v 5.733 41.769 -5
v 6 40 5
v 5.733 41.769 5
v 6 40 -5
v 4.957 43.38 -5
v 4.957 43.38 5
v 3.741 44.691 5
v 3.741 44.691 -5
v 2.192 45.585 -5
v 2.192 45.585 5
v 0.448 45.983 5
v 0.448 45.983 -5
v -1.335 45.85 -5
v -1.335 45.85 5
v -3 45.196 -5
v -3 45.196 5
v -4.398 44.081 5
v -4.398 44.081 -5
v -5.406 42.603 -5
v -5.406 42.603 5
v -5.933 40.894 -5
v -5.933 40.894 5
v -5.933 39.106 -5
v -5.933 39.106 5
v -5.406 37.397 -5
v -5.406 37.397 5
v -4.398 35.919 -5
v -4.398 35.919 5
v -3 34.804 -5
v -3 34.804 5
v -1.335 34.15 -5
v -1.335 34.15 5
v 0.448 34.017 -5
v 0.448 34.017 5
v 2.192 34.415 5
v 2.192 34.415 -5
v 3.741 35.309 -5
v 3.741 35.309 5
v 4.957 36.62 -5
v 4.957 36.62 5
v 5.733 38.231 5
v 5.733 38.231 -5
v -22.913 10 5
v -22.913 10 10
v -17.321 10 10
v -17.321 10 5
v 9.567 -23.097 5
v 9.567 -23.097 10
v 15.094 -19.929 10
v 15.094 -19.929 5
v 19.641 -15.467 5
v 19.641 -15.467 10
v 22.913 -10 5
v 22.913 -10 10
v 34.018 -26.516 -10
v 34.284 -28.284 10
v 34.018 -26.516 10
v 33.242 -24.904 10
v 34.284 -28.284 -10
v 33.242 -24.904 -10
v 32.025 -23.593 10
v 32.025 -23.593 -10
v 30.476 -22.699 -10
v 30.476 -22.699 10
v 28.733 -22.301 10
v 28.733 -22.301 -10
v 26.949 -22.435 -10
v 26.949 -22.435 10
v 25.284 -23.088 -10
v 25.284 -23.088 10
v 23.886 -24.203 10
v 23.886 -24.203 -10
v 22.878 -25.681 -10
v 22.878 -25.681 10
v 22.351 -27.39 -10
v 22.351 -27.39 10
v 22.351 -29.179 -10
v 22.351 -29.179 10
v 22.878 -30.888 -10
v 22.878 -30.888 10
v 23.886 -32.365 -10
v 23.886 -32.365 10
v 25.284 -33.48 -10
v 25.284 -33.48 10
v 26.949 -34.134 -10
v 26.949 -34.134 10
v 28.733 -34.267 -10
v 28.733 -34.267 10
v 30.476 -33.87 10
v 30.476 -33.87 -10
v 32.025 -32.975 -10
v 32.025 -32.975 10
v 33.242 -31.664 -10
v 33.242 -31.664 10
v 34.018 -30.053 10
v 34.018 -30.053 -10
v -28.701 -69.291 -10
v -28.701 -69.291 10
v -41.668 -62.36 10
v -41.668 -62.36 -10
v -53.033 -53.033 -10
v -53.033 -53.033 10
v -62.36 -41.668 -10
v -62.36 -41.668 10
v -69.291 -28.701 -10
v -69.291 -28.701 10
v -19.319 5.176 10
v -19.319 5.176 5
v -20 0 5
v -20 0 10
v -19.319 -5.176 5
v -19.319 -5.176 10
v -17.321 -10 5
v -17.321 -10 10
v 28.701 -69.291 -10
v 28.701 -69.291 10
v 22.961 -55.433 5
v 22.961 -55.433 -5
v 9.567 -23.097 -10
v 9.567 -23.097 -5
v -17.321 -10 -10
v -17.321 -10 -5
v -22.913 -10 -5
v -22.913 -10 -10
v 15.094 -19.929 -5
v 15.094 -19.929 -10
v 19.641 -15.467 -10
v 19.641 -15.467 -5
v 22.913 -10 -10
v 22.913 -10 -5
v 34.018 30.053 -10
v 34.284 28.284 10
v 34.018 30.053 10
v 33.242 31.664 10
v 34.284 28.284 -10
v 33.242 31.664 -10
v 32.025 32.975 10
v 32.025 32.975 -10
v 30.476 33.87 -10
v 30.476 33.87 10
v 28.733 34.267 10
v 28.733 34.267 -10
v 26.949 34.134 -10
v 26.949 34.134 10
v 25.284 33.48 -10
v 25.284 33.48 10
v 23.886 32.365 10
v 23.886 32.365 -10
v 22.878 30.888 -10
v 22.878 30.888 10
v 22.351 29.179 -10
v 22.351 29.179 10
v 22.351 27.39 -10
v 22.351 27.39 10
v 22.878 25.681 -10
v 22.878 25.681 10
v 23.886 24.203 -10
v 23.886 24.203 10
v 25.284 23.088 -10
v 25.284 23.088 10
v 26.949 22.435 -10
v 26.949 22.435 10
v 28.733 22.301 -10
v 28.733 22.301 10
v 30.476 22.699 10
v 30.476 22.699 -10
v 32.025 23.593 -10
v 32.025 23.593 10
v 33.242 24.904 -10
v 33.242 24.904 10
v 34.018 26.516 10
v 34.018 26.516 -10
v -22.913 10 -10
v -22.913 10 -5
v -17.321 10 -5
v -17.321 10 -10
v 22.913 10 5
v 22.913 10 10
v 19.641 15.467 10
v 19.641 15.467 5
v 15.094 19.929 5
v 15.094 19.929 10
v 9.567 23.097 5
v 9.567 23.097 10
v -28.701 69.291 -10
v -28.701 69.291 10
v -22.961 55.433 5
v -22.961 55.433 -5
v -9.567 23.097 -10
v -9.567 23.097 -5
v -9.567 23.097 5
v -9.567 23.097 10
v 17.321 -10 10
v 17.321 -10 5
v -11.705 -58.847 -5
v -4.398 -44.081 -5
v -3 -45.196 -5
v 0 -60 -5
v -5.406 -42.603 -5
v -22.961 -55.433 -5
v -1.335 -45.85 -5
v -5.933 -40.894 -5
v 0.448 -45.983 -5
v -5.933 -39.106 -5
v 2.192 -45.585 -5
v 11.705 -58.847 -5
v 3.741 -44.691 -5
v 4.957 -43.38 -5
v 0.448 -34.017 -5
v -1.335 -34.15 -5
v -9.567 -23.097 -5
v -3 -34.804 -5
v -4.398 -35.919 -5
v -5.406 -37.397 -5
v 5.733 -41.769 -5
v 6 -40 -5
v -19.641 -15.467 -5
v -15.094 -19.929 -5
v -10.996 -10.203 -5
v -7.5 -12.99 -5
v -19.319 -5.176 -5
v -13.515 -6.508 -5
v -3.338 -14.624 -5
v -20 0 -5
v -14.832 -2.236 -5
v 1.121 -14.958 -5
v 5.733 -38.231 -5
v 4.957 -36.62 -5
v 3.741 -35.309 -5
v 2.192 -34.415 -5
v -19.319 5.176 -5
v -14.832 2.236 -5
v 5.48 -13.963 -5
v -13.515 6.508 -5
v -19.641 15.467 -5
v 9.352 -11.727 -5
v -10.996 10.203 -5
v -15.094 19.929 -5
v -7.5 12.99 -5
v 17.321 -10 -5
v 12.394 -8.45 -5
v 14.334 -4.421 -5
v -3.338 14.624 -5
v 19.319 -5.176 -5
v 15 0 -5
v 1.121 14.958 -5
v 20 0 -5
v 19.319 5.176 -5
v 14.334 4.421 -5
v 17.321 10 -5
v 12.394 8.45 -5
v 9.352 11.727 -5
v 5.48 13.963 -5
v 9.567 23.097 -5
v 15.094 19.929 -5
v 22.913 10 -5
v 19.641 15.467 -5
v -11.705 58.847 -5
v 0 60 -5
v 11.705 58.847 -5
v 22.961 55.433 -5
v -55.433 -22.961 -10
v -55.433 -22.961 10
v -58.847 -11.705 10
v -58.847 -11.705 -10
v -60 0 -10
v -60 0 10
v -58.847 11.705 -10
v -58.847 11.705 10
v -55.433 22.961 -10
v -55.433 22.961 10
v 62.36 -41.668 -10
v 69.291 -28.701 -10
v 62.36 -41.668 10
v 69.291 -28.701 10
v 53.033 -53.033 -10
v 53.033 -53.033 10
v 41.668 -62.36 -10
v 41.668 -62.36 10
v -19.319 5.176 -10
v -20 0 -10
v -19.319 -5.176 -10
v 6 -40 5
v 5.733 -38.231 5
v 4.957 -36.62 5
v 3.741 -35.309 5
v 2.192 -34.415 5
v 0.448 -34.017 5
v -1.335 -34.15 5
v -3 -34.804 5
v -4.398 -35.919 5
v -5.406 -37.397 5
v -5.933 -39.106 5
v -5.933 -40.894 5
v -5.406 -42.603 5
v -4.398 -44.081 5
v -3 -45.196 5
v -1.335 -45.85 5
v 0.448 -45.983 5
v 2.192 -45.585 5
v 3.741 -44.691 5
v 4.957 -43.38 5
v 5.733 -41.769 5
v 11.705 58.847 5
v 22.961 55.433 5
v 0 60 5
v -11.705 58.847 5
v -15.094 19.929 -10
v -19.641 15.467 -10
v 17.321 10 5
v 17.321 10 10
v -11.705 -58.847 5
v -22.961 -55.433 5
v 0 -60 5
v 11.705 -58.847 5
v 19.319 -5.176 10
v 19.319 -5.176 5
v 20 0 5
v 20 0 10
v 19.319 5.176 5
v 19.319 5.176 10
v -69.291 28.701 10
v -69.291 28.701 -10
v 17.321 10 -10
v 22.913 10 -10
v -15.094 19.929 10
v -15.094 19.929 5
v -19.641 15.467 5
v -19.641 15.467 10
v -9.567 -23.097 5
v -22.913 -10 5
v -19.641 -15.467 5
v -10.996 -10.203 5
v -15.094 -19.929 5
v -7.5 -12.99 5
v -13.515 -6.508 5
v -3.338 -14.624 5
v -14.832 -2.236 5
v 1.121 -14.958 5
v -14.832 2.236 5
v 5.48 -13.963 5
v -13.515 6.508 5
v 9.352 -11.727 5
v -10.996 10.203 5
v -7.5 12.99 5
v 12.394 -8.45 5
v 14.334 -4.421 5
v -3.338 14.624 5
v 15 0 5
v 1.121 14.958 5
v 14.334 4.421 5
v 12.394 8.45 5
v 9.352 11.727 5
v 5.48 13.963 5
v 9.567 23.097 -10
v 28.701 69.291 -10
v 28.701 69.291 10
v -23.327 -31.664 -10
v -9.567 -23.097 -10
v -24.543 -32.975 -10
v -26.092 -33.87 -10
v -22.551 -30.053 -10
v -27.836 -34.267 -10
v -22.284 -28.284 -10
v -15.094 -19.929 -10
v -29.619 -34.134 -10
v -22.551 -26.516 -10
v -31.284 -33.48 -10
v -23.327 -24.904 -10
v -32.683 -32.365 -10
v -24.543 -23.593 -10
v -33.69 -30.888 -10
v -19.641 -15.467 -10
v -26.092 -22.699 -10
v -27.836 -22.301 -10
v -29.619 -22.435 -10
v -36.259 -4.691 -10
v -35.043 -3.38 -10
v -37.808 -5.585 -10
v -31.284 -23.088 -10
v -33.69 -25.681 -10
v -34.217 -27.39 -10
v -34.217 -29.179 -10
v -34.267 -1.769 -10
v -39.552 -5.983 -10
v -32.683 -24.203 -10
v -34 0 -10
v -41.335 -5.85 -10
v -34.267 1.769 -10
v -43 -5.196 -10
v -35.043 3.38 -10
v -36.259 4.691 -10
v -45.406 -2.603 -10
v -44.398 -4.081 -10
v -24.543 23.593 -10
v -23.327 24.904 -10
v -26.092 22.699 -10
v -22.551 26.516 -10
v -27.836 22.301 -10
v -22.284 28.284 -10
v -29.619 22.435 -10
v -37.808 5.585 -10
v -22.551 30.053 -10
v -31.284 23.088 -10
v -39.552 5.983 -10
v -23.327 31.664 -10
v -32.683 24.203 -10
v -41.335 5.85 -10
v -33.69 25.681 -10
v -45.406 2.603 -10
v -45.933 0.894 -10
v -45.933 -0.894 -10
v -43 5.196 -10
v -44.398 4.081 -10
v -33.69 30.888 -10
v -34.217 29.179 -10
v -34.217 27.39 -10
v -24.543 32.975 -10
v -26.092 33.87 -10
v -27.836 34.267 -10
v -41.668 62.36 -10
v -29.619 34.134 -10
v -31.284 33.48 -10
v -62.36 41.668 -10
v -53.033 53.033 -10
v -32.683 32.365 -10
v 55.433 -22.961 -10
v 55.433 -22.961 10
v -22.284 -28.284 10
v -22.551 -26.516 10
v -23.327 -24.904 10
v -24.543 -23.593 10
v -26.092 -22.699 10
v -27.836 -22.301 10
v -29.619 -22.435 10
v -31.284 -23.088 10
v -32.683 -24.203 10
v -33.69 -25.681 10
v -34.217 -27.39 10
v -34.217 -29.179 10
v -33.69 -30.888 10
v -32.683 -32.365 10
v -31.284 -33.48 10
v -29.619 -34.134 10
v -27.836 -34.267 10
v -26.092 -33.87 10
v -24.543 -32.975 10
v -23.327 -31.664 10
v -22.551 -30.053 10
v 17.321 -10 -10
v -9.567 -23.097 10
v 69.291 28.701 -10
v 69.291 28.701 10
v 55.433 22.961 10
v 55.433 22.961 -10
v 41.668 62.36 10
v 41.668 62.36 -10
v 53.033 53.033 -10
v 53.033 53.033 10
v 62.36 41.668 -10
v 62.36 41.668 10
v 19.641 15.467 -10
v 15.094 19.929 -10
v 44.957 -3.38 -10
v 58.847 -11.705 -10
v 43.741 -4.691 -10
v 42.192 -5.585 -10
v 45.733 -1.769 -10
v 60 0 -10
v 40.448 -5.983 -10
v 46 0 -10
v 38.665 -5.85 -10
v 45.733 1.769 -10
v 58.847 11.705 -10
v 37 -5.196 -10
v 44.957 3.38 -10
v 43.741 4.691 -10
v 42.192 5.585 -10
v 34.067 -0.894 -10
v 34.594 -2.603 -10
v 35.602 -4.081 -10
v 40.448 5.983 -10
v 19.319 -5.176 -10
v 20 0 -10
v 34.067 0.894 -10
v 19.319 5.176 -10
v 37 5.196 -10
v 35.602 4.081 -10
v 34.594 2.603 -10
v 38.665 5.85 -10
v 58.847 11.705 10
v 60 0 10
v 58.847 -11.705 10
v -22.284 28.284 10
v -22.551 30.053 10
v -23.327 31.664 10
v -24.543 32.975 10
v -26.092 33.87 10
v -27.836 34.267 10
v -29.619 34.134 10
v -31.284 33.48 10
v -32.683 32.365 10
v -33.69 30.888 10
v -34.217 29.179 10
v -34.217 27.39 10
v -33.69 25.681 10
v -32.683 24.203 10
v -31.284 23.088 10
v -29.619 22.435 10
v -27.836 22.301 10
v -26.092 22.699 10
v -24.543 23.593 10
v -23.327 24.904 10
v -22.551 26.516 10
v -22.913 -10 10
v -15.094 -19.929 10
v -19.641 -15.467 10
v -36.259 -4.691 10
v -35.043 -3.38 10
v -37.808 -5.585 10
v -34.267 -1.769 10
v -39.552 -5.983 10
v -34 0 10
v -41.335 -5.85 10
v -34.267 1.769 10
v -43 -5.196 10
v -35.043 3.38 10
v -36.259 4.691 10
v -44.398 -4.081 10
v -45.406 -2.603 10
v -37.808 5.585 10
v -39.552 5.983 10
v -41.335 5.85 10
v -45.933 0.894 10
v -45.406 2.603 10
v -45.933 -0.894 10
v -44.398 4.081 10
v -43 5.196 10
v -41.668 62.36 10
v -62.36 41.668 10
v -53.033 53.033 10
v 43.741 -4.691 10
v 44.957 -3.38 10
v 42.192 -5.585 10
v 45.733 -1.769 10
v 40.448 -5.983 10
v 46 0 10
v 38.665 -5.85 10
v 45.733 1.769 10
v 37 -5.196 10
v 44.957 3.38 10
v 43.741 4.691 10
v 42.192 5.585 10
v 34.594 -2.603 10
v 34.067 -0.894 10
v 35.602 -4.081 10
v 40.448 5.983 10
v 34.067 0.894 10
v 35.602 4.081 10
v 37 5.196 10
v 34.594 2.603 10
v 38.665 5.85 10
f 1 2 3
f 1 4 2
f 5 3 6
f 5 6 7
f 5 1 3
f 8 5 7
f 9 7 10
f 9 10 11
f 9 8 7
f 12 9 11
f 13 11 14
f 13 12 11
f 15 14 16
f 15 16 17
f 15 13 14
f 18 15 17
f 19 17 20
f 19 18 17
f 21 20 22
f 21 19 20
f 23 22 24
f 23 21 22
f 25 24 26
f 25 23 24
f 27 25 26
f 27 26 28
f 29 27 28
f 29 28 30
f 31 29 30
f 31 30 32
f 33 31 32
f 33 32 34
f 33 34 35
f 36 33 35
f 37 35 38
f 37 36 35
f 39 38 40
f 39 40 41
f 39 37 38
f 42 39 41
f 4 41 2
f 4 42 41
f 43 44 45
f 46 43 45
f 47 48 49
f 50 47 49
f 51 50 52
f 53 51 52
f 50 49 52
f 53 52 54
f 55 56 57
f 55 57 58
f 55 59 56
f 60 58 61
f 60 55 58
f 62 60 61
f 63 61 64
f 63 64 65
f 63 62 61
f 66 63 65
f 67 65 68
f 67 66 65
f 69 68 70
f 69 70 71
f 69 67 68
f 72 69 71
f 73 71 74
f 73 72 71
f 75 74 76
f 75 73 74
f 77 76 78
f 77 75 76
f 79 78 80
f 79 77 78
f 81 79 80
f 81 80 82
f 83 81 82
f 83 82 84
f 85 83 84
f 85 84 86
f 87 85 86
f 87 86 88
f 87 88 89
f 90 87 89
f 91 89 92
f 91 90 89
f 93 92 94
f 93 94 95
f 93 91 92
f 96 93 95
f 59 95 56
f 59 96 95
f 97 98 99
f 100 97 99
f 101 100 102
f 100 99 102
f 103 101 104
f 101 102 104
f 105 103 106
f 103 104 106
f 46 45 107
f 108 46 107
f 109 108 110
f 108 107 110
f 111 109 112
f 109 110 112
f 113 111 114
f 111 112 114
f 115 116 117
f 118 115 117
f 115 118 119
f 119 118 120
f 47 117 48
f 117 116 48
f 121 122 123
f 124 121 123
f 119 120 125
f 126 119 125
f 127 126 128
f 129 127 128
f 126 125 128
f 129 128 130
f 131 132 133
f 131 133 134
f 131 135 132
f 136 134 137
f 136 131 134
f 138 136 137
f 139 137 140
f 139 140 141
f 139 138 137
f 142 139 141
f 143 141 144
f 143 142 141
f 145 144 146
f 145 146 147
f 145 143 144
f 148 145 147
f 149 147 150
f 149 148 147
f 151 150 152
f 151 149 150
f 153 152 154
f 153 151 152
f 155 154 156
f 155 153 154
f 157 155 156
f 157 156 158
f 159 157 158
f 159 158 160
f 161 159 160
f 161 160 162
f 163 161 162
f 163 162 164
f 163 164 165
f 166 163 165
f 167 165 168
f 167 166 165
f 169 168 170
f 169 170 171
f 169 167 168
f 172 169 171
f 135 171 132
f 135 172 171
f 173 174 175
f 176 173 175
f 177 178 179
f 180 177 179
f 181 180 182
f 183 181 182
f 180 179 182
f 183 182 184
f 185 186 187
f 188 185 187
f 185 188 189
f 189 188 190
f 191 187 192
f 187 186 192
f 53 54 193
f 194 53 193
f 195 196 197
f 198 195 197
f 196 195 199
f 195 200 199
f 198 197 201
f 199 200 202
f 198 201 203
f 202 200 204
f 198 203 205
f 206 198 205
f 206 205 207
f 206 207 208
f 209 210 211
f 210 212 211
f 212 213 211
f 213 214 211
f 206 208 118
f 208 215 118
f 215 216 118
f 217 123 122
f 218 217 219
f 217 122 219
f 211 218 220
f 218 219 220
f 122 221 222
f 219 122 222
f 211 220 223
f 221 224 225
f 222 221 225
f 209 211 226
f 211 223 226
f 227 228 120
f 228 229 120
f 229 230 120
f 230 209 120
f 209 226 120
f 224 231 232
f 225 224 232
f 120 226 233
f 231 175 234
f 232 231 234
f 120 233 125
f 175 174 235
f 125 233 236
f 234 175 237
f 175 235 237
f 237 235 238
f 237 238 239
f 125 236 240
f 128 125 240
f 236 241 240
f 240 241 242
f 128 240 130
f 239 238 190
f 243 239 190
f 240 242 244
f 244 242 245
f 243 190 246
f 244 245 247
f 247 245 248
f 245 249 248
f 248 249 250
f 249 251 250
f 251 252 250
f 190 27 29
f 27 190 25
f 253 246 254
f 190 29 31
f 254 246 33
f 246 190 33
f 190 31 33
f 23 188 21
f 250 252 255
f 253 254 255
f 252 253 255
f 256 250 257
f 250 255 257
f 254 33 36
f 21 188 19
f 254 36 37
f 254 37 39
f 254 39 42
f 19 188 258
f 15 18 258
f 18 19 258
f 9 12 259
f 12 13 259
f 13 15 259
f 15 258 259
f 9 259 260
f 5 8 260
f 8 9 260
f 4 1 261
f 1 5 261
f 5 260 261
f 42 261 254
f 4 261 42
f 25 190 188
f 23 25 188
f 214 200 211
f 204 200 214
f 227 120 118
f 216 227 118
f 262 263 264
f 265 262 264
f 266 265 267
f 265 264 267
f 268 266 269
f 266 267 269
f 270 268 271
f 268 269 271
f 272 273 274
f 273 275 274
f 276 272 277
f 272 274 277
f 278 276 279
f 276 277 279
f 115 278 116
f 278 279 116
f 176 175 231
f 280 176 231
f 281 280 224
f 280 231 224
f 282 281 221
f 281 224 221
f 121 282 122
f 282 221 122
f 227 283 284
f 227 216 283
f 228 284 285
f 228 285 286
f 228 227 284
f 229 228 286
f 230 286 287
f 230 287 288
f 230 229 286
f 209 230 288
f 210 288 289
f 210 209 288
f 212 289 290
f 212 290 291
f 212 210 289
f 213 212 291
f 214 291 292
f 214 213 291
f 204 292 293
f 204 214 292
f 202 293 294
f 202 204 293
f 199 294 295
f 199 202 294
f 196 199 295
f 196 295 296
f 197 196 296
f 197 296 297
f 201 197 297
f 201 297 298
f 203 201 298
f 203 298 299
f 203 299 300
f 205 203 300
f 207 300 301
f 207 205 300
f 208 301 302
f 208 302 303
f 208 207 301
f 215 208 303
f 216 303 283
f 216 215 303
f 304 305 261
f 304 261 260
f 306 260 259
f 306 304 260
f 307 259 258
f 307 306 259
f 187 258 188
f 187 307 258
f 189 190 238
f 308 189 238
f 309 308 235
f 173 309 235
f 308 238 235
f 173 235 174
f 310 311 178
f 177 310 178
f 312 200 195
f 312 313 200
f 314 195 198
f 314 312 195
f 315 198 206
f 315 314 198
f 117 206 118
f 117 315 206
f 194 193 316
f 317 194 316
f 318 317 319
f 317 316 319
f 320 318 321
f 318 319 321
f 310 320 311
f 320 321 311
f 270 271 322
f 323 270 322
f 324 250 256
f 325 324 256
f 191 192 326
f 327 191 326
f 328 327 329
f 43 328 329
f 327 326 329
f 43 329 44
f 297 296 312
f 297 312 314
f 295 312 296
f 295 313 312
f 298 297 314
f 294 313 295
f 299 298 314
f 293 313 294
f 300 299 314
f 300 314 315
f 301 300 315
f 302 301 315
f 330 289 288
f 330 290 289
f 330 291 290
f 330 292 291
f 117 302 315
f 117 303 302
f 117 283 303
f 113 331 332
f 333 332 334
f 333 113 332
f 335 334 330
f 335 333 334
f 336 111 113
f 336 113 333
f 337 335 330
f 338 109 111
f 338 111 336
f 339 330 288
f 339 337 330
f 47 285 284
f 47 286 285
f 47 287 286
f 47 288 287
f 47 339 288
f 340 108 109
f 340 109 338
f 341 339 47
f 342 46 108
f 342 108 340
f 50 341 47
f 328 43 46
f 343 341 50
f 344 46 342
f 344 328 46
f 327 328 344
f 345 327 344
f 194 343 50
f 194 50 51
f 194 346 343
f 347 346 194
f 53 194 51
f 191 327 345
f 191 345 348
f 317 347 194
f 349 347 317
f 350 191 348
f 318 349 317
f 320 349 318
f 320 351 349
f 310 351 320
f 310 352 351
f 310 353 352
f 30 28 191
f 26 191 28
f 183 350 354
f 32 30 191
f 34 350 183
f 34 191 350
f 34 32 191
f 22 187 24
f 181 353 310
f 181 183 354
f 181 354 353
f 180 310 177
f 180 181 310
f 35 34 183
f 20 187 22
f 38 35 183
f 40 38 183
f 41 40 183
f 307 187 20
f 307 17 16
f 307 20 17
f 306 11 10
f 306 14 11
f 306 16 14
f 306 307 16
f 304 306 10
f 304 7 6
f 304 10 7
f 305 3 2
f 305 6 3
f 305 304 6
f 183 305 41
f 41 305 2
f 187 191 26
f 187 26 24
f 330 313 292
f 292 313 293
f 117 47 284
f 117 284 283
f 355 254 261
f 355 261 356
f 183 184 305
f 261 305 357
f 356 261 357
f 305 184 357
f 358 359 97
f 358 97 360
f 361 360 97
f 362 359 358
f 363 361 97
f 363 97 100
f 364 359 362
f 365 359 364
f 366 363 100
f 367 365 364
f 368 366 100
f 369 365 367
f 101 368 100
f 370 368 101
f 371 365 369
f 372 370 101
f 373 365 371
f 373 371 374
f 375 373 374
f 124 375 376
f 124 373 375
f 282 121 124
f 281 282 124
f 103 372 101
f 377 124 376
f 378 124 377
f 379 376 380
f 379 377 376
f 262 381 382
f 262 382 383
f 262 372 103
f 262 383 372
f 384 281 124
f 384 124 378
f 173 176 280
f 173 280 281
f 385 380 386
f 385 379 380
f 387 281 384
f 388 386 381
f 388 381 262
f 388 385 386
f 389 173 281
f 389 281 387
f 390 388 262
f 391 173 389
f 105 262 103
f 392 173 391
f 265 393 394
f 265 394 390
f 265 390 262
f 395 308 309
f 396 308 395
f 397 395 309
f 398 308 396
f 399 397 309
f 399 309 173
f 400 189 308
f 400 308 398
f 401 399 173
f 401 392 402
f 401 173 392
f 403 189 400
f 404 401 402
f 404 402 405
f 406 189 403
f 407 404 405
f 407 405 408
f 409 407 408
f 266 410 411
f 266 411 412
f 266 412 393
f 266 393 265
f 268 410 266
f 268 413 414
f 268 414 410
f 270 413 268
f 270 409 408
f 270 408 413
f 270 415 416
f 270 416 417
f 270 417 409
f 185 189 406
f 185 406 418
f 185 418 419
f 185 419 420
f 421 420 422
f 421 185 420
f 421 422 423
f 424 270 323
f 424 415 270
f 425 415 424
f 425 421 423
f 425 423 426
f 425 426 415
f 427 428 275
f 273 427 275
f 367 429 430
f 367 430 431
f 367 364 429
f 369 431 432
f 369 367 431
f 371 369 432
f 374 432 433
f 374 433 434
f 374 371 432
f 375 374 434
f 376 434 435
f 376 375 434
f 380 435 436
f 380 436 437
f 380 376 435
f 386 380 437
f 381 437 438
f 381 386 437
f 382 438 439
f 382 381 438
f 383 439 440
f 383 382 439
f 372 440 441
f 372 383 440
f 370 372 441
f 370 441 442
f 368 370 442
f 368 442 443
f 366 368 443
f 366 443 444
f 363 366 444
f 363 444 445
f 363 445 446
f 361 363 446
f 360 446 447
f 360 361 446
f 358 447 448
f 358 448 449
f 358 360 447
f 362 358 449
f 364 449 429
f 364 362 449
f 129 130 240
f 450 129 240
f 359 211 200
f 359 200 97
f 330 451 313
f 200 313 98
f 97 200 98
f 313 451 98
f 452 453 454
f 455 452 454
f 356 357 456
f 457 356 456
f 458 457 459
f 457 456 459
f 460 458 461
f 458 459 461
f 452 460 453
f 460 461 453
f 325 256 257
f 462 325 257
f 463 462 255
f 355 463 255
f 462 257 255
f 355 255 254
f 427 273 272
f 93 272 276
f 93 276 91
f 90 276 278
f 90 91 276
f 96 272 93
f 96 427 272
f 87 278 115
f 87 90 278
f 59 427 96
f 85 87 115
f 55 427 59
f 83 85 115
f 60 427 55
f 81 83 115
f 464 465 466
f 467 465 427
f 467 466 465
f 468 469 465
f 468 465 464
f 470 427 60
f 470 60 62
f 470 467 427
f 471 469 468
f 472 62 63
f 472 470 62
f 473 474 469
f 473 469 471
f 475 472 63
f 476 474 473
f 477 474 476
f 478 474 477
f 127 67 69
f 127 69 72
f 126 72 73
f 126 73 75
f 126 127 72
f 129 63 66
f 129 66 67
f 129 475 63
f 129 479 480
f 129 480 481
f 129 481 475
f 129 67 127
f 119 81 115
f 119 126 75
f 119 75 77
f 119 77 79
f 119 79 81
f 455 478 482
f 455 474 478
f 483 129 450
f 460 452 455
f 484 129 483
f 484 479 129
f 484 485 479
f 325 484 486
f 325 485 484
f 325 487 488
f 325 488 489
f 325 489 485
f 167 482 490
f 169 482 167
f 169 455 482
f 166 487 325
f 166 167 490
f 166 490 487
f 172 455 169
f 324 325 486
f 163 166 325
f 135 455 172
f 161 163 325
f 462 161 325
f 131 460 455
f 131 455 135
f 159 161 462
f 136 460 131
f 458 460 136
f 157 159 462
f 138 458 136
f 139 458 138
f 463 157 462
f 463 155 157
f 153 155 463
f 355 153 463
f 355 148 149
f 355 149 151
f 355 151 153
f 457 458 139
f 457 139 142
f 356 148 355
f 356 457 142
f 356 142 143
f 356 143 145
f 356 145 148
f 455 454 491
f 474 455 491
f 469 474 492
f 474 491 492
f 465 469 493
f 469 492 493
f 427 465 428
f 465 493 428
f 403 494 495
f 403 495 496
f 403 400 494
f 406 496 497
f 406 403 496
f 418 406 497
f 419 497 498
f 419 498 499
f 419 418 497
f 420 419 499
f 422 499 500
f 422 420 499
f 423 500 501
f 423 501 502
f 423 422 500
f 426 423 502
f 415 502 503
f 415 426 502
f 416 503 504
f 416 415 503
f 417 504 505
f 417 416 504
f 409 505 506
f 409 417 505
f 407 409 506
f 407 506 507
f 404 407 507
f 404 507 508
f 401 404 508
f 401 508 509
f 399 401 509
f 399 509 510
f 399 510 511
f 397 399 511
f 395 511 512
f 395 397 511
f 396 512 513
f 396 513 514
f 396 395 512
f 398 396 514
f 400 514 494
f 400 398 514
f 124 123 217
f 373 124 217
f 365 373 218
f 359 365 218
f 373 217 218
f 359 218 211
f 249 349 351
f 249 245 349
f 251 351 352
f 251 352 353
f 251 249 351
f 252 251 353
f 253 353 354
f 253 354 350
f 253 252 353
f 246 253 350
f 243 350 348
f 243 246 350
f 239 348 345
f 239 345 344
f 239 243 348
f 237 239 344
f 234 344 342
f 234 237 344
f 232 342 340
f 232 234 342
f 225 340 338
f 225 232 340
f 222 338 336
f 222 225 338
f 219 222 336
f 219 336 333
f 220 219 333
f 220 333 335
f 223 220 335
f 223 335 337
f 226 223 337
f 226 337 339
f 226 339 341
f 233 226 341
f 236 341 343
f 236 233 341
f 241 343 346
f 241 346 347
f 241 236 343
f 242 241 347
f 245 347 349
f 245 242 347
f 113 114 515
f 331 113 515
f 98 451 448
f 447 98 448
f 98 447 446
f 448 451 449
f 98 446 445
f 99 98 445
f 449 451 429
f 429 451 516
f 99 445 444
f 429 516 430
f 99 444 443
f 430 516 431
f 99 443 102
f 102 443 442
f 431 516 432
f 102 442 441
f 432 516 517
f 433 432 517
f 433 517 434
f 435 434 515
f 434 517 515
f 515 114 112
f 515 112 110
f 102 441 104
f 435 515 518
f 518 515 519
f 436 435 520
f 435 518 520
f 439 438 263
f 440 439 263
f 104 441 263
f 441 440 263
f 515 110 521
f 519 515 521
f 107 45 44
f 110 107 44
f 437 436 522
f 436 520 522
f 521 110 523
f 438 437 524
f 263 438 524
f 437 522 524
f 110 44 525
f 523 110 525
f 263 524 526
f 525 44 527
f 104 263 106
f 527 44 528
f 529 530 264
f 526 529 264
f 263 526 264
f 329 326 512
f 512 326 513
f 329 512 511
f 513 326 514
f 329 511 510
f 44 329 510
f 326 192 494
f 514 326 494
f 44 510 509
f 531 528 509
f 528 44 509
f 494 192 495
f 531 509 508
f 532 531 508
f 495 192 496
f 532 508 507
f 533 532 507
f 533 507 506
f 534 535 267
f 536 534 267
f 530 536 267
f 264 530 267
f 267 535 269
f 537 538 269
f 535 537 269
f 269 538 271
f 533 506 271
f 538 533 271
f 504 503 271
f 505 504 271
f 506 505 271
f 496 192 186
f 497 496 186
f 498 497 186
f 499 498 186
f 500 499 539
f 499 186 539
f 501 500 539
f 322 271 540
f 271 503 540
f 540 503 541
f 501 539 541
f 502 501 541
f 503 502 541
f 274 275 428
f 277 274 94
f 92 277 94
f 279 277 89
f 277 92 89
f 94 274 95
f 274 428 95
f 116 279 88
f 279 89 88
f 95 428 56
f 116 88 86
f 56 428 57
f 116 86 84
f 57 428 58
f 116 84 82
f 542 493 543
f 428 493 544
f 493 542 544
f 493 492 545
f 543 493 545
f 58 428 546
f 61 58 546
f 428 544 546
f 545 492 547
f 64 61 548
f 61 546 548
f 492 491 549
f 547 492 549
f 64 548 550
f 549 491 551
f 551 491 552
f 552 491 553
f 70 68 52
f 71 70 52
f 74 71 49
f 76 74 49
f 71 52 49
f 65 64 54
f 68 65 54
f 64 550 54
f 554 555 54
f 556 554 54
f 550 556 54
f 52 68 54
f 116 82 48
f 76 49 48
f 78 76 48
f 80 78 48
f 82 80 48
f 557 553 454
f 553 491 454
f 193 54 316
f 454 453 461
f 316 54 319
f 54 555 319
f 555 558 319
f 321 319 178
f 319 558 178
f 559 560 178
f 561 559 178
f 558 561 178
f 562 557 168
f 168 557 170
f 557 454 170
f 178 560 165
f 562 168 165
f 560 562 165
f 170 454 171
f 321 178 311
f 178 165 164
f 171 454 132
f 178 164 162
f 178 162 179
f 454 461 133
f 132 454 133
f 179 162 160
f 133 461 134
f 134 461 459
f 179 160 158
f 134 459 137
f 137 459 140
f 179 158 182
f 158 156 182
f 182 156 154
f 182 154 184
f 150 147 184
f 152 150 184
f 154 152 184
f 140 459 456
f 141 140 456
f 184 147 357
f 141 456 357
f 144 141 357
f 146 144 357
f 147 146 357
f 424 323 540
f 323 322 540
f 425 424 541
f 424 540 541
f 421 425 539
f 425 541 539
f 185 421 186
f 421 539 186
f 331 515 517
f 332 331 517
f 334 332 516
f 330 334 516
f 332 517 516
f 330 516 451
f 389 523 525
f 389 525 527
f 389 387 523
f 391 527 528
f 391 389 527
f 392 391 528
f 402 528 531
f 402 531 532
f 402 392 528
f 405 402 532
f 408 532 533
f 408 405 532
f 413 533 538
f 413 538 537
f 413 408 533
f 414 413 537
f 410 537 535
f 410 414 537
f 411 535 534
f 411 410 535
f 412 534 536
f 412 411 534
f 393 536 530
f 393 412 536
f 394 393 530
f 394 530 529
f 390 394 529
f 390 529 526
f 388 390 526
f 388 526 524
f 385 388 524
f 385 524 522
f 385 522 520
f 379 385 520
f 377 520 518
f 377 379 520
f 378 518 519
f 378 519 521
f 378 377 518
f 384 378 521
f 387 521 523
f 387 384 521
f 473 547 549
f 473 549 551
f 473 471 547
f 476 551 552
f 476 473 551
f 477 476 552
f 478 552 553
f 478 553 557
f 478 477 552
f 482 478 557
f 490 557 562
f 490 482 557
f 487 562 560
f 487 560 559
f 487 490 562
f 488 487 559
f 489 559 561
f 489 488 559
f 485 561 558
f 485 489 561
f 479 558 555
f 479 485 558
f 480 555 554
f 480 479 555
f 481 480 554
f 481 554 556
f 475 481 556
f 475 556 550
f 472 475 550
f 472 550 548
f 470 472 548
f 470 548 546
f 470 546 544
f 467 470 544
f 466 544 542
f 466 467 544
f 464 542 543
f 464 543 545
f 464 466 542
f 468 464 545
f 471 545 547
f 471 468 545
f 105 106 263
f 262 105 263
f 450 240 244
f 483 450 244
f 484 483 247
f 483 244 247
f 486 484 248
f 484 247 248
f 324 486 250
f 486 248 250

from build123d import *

# Parameters (mm, degrees)
SKETCH1_R             = 6
BOSS_EXTRUDE1_DEPTH   = 10
BOSS_EXTRUDE1_2_DEPTH = 10
SKETCH1_3_R           = 6
SKETCH1_3_R_2         = 15
BOSS_EXTRUDE2_DEPTH   = 5


with BuildPart() as part:
    # Sketch1 → Boss-Extrude1 (new, symmetric)
    with BuildSketch(Plane.XY):
        with BuildLine():
            Line((28.701257427, 69.290964938), (9.567085809, 23.096988313))
            ThreePointArc((9.567085809, 23.096988313), (17.510562404, 17.843211715), (22.912878475, 10))
            Line((22.912878475, 10), (17.320508076, 10))
            ThreePointArc((17.320508076, 10), (20, 0), (17.320508076, -10))
            Line((17.320508076, -10), (22.912878475, -10))
            ThreePointArc((22.912878475, -10), (17.510562404, -17.843211715), (9.567085809, -23.096988313))
            Line((9.567085809, -23.096988313), (28.701257427, -69.290964938))
            ThreePointArc((28.701257427, -69.290964938), (53.033008589, -53.033008589), (69.290964938, -28.701257427))
            Line((69.290964938, -28.701257427), (55.432771951, -22.961005942))
            ThreePointArc((55.432771951, -22.961005942), (60, 0), (55.432771951, 22.961005942))
            Line((55.432771951, 22.961005942), (69.290964938, 28.701257427))
            ThreePointArc((69.290964938, 28.701257427), (53.033008589, 53.033008589), (28.701257427, 69.290964938))
        make_face()
        with Locations((28.284271247, -28.284271247)):
            Circle(SKETCH1_R, mode=Mode.SUBTRACT)
        with Locations((40, 0)):
            Circle(SKETCH1_R, mode=Mode.SUBTRACT)
        with Locations((28.284271247, 28.284271247)):
            Circle(SKETCH1_R, mode=Mode.SUBTRACT)
    extrude(amount=BOSS_EXTRUDE1_DEPTH, both=True)



with BuildPart() as body_2:
    # Sketch1 → Boss-Extrude1 2 (new, symmetric)
    with BuildSketch(Plane.XY):
        with BuildLine():
            Line((-9.567085809, 23.096988313), (-28.701257427, 69.290964938))
            ThreePointArc((-28.701257427, 69.290964938), (-53.033008589, 53.033008589), (-69.290964938, 28.701257427))
            Line((-69.290964938, 28.701257427), (-55.432771951, 22.961005942))
            ThreePointArc((-55.432771951, 22.961005942), (-60, 0), (-55.432771951, -22.961005942))
            Line((-55.432771951, -22.961005942), (-69.290964938, -28.701257427))
            ThreePointArc((-69.290964938, -28.701257427), (-53.033008589, -53.033008589), (-28.701257427, -69.290964938))
            Line((-28.701257427, -69.290964938), (-9.567085809, -23.096988313))
            ThreePointArc((-9.567085809, -23.096988313), (-17.510562404, -17.843211715), (-22.912878475, -10))
            Line((-22.912878475, -10), (-17.320508076, -10))
            ThreePointArc((-17.320508076, -10), (-20, 0), (-17.320508076, 10))
            Line((-17.320508076, 10), (-22.912878475, 10))
            ThreePointArc((-22.912878475, 10), (-17.510562404, 17.843211715), (-9.567085809, 23.096988313))
        make_face()
        with Locations((-28.284271247, -28.284271247)):
            Circle(SKETCH1_R, mode=Mode.SUBTRACT)
        with Locations((-40, 0)):
            Circle(SKETCH1_R, mode=Mode.SUBTRACT)
        with Locations((-28.284271247, 28.284271247)):
            Circle(SKETCH1_R, mode=Mode.SUBTRACT)
    extrude(amount=BOSS_EXTRUDE1_2_DEPTH, both=True)


with BuildPart() as part_1:
    add(part.part)

    add(body_2.part)  # Boss-Extrude2 merges body 2
    # Sketch1<3> → Boss-Extrude2 (add, symmetric)
    with BuildSketch(Plane.XY):
        with BuildLine():
            ThreePointArc((22.912878475, 10), (17.510562404, 17.843211715), (9.567085809, 23.096988313))
            Line((9.567085809, 23.096988313), (22.961005942, 55.432771951))
            ThreePointArc((22.961005942, 55.432771951), (0, 60), (-22.961005942, 55.432771951))
            Line((-22.961005942, 55.432771951), (-9.567085809, 23.096988313))
            ThreePointArc((-9.567085809, 23.096988313), (-17.510562404, 17.843211715), (-22.912878475, 10))
            Line((-22.912878475, 10), (-17.320508076, 10))
            ThreePointArc((-17.320508076, 10), (-20, 0), (-17.320508076, -10))
            Line((-17.320508076, -10), (-22.912878475, -10))
            ThreePointArc((-22.912878475, -10), (-17.510562404, -17.843211715), (-9.567085809, -23.096988313))
            Line((-9.567085809, -23.096988313), (-22.961005942, -55.432771951))
            ThreePointArc((-22.961005942, -55.432771951), (0, -60), (22.961005942, -55.432771951))
            Line((22.961005942, -55.432771951), (9.567085809, -23.096988313))
            ThreePointArc((9.567085809, -23.096988313), (17.510562404, -17.843211715), (22.912878475, -10))
            Line((22.912878475, -10), (17.320508076, -10))
            ThreePointArc((17.320508076, -10), (20, 0), (17.320508076, 10))
            Line((17.320508076, 10), (22.912878475, 10))
        make_face()
        with Locations((0, -40)):
            Circle(SKETCH1_3_R, mode=Mode.SUBTRACT)
        Circle(SKETCH1_3_R_2, mode=Mode.SUBTRACT)
        with Locations((0, 40)):
            Circle(SKETCH1_3_R, mode=Mode.SUBTRACT)
    extrude(amount=BOSS_EXTRUDE2_DEPTH, both=True)


solid = part_1.part
